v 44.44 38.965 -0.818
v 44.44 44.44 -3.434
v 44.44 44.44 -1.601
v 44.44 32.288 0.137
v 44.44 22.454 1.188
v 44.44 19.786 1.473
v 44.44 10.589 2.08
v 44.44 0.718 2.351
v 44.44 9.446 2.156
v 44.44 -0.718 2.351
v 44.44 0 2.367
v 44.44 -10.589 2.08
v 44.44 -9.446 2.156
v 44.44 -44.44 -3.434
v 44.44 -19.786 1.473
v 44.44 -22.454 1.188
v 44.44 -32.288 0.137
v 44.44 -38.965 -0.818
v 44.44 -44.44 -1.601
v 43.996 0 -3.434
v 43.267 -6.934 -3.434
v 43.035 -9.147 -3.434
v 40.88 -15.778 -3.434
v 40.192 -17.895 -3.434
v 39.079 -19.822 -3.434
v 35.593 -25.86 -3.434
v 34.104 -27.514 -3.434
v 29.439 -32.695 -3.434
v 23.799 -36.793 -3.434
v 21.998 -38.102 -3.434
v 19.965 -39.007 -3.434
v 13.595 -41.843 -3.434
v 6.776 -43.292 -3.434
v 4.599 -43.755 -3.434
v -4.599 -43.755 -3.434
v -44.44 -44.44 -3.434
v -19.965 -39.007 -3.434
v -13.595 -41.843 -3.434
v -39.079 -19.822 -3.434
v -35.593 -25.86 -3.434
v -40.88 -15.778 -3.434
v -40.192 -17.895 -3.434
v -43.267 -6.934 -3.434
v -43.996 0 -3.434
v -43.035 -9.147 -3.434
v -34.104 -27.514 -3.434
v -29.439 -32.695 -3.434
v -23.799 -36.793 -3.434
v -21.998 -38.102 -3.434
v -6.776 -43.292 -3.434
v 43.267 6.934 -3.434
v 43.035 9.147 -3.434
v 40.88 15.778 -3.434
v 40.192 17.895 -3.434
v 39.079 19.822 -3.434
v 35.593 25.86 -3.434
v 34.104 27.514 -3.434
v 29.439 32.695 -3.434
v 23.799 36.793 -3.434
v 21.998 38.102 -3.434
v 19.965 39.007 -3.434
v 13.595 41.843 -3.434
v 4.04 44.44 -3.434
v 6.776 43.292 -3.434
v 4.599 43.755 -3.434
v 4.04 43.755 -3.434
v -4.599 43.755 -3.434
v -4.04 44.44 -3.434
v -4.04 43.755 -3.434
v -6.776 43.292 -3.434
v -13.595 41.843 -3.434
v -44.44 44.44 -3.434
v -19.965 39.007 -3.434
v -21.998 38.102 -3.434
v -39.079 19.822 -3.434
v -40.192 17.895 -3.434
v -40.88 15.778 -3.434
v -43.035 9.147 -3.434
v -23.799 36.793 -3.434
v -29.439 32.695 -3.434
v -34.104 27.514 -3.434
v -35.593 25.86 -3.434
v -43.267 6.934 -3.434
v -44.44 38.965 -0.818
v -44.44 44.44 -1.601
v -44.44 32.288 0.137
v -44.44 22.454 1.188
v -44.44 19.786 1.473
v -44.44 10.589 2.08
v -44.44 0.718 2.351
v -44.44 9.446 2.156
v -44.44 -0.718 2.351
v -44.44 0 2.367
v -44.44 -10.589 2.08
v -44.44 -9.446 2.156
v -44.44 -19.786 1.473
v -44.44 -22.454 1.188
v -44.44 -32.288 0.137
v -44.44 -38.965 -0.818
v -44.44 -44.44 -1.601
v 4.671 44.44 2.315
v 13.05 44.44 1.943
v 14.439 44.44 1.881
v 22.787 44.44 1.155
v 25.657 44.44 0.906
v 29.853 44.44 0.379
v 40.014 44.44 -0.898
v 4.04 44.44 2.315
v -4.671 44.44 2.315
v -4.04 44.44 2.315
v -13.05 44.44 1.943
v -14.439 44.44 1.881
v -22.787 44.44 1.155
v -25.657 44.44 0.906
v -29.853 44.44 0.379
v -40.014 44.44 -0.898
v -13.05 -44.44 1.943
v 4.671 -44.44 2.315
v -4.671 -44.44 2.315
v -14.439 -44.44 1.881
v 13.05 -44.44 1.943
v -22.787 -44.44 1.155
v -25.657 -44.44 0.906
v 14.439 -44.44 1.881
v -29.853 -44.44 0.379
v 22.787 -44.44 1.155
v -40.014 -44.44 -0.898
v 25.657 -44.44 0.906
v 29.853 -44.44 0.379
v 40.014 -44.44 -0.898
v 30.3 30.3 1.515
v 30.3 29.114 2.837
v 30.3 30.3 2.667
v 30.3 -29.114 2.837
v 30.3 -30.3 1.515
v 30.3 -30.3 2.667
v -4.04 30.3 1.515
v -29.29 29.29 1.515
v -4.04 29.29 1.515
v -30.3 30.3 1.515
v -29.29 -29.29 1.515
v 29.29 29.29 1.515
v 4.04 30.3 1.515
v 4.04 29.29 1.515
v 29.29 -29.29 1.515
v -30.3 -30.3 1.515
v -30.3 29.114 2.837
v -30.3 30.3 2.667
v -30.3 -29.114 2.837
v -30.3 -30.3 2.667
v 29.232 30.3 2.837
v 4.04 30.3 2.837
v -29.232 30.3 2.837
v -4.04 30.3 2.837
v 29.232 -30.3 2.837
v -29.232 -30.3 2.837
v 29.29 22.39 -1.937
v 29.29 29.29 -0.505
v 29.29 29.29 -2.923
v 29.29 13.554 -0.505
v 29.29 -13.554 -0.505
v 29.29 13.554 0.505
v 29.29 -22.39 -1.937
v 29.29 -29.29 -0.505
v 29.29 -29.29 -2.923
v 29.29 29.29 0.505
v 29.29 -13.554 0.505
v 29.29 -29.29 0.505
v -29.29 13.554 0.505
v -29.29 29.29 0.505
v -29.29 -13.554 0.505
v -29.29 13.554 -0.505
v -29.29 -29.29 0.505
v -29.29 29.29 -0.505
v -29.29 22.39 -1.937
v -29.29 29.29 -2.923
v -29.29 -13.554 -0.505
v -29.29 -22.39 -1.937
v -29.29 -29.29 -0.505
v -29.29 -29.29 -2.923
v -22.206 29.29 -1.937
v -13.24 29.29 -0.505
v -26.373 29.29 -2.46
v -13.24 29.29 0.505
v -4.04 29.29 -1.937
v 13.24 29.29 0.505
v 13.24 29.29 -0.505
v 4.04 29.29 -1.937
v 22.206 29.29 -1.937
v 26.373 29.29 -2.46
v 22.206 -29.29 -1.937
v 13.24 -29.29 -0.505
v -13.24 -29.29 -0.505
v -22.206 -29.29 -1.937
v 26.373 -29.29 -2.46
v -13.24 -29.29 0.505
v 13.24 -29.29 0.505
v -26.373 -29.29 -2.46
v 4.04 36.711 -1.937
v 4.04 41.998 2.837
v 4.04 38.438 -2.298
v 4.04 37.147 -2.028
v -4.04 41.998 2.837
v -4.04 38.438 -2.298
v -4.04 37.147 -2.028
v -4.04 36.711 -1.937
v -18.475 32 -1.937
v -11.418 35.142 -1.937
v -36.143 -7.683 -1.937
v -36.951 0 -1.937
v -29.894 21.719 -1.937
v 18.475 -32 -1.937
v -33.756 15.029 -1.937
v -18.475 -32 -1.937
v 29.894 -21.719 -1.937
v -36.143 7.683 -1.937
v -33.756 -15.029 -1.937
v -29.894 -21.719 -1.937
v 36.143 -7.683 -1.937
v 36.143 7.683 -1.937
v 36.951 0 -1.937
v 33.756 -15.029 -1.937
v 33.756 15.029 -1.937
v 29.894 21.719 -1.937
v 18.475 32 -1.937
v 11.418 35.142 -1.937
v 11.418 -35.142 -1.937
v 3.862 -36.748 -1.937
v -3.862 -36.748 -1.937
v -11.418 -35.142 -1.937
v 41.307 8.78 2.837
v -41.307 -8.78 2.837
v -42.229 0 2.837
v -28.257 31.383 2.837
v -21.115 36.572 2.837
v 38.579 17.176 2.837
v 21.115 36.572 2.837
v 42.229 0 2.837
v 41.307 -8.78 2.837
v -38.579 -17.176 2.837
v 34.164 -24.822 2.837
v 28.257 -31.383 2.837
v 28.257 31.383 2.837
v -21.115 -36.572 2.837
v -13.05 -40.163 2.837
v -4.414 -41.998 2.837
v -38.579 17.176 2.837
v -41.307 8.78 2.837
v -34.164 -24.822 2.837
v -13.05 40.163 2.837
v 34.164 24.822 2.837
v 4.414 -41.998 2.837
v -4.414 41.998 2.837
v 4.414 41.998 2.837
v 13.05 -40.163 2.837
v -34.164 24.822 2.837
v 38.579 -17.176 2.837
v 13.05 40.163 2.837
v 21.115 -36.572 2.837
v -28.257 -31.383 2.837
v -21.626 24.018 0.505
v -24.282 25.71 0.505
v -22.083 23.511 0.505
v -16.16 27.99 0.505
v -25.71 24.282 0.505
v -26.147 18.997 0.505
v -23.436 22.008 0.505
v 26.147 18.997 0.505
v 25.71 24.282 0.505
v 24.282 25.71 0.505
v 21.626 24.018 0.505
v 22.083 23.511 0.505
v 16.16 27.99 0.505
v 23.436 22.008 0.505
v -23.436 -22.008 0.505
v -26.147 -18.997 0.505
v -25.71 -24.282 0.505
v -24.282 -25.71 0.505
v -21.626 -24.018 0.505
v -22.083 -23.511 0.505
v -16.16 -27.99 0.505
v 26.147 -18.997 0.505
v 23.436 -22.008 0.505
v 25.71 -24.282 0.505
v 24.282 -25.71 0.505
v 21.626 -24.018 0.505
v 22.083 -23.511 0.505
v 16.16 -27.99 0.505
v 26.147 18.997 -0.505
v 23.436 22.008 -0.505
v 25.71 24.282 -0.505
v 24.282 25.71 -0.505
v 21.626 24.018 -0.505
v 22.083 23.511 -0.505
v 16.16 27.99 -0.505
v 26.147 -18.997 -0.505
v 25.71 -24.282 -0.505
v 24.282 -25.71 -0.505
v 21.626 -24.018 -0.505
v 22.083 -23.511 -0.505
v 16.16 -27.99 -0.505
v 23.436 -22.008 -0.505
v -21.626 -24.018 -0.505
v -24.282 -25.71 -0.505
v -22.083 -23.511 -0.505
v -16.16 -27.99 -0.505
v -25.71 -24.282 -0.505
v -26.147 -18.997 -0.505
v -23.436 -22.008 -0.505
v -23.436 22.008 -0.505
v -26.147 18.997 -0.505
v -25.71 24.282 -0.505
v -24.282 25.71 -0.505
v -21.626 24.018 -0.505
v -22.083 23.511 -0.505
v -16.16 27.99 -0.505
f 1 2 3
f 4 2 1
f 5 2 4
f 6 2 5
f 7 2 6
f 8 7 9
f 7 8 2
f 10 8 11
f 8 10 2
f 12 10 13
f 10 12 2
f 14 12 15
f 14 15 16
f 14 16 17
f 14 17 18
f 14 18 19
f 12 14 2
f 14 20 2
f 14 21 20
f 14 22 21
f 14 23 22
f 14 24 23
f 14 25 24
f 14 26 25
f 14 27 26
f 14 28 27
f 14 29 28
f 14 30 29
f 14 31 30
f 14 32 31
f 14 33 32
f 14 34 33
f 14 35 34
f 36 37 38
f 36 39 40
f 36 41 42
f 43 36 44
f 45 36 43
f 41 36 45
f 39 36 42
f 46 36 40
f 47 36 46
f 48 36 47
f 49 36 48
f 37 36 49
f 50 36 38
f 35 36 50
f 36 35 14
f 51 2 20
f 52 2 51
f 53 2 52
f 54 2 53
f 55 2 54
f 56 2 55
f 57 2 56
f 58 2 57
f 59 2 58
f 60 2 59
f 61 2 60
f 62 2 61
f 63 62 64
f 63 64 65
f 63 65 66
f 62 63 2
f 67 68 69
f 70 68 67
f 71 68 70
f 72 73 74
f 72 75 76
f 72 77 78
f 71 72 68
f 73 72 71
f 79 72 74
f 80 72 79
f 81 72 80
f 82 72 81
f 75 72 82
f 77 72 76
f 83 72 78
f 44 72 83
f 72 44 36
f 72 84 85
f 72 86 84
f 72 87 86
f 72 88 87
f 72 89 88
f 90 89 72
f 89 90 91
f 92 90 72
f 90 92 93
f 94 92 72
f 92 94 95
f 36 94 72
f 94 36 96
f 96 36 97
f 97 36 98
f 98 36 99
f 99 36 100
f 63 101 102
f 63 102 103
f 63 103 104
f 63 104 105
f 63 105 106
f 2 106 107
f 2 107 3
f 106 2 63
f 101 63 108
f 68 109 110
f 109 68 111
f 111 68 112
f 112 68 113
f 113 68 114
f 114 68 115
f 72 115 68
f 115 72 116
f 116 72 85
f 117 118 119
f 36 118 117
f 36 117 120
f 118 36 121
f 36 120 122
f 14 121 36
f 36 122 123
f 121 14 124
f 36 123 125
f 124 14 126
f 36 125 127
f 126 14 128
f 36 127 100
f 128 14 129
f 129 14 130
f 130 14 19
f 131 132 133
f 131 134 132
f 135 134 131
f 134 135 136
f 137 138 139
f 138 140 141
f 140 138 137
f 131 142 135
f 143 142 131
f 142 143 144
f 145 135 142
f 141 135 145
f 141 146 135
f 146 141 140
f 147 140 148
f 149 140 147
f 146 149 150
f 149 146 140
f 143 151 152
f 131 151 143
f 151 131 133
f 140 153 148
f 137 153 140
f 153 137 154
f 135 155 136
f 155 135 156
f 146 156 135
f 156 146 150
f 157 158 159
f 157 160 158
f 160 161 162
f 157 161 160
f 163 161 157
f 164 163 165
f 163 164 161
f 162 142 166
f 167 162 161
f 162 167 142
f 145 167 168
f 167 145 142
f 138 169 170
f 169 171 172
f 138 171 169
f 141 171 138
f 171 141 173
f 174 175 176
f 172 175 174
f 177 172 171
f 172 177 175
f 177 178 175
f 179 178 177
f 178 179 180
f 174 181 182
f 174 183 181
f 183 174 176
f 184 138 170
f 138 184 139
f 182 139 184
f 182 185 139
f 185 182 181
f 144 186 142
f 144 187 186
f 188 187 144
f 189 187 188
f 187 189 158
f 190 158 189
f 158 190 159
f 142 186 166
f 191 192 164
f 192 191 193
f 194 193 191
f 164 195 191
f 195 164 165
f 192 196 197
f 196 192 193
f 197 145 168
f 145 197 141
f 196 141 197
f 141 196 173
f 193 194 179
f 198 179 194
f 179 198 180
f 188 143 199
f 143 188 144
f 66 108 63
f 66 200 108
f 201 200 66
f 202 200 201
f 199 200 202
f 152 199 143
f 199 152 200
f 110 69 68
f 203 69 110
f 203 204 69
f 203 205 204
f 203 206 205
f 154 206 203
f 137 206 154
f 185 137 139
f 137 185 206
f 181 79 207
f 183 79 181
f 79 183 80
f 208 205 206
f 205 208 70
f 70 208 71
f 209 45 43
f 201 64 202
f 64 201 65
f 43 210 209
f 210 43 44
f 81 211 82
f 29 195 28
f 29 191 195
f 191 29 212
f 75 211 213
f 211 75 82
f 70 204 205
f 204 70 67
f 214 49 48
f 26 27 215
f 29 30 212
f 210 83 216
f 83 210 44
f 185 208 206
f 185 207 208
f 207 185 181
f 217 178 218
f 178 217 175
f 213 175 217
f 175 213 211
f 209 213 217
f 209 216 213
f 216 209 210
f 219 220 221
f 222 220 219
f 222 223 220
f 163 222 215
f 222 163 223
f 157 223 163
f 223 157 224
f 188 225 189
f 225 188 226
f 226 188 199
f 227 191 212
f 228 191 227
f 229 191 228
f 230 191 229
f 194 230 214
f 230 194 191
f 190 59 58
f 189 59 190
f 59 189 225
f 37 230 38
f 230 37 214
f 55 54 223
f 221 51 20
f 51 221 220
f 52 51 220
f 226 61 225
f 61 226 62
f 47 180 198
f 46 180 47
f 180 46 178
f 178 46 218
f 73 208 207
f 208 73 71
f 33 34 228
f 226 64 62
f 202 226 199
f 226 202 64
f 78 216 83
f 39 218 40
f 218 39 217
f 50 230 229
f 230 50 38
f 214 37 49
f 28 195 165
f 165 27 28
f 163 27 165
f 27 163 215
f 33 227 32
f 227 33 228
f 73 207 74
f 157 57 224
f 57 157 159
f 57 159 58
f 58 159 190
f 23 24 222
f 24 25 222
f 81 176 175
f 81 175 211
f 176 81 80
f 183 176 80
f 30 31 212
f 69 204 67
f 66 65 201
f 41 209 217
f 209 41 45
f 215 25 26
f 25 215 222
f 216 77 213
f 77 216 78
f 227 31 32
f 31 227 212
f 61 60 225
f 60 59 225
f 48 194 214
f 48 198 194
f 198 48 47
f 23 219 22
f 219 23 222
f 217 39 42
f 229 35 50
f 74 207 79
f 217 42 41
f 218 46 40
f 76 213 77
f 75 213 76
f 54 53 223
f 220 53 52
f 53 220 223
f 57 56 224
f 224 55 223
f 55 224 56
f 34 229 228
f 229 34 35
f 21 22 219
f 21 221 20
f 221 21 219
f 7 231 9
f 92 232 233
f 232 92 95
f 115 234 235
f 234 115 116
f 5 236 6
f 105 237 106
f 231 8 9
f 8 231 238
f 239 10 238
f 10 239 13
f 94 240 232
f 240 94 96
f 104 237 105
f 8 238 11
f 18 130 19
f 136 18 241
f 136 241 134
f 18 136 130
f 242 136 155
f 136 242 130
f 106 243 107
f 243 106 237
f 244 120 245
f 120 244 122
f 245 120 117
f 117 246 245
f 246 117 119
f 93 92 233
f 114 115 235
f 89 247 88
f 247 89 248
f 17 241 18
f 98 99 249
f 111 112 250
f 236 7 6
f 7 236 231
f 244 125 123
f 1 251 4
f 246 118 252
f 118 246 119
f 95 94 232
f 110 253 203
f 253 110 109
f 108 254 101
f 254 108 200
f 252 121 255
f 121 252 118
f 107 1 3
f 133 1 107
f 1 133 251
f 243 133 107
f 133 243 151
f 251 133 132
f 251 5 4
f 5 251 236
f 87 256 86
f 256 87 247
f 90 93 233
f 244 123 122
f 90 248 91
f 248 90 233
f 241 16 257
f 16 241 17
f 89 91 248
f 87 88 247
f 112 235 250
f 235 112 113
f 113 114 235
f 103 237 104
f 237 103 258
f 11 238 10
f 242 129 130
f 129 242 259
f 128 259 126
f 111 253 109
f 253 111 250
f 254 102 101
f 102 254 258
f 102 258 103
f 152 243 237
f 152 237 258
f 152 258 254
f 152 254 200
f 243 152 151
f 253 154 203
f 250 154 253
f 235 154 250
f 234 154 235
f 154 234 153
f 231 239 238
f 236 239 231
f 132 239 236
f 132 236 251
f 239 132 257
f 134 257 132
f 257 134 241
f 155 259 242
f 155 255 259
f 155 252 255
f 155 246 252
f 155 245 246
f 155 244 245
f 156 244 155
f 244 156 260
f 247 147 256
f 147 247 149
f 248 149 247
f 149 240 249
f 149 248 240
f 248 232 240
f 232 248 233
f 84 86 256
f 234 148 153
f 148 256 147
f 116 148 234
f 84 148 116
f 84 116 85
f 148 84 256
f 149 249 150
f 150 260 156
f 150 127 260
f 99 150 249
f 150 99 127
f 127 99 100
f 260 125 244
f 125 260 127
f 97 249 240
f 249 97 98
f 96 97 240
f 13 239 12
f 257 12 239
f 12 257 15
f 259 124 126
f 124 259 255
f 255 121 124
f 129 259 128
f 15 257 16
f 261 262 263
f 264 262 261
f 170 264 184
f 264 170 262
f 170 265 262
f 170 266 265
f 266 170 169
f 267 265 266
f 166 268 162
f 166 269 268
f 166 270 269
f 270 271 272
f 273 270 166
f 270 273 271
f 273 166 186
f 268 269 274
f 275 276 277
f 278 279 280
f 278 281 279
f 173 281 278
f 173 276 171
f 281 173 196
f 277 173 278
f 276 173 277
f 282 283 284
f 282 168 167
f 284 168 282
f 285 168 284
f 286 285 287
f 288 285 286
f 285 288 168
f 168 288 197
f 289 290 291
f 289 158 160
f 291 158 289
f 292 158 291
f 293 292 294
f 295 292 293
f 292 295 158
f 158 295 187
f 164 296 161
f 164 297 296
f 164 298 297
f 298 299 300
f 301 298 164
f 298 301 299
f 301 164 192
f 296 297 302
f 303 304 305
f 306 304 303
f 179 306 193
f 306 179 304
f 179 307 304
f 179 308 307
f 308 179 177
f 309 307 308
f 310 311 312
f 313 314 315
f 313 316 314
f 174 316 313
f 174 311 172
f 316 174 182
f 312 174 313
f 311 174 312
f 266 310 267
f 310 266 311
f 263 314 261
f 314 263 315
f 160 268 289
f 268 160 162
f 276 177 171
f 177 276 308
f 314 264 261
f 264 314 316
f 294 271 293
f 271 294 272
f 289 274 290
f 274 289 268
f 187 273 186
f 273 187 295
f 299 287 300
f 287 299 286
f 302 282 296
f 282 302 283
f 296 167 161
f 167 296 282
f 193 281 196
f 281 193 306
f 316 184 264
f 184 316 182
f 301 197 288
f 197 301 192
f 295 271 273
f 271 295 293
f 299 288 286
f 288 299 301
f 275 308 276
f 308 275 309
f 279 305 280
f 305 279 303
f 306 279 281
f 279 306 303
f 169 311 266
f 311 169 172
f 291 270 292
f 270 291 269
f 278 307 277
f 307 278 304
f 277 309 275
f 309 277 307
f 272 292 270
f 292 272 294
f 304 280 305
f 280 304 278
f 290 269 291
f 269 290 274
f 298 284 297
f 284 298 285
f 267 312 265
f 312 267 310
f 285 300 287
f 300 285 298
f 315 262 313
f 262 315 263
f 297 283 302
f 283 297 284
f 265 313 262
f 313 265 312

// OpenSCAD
// Poweroutlet frontpanel with cable slot
// 27.10.2017 Lukas Grimm <ombre@ombre.ch>
// This program is free software: you can redistribute it and/or modify
// it under the terms of the GNU General Public License as published by
// the Free Software Foundation, either version 3 of the License, or
// (at your option) any later version.
//
// This program is distributed in the hope that it will be useful,
// but WITHOUT ANY WARRANTY; without even the implied warranty of
// MERCHANTABILITY or FITNESS FOR A PARTICULAR PURPOSE.  See the
// GNU General Public License for more details.
//
// You should have received a copy of the GNU General Public License
// along with this program.  If not, see <http://www.gnu.org/licenses/>.
scale([1.01,1.01,1.01]){
    intersection () {
        difference () {
            cube([88,88,06.8], center=true);
            translate([0,0,2.5]){
                cube([60,60,2], center=true);
            };
            cube([58,58,102], center=true);
            translate([0,44,0]){
                cube([8, 31,6.9], center=true);
            };
            translate([0,0,-350]){
                sphere(350);
            };
        };
        translate([0,0,-395]){
            sphere(400);
        };
    };
    difference () {
        cube([58,58,01], center=true);
        translate([0,0,-30]){
            cylinder(50,32,32);
        };
        rotate([0,0,45]) {
            cube([70,2,2], center=true);
        };
        rotate([0,0,135]) {
            cube([70,2,2], center=true);
        };
    };
}
